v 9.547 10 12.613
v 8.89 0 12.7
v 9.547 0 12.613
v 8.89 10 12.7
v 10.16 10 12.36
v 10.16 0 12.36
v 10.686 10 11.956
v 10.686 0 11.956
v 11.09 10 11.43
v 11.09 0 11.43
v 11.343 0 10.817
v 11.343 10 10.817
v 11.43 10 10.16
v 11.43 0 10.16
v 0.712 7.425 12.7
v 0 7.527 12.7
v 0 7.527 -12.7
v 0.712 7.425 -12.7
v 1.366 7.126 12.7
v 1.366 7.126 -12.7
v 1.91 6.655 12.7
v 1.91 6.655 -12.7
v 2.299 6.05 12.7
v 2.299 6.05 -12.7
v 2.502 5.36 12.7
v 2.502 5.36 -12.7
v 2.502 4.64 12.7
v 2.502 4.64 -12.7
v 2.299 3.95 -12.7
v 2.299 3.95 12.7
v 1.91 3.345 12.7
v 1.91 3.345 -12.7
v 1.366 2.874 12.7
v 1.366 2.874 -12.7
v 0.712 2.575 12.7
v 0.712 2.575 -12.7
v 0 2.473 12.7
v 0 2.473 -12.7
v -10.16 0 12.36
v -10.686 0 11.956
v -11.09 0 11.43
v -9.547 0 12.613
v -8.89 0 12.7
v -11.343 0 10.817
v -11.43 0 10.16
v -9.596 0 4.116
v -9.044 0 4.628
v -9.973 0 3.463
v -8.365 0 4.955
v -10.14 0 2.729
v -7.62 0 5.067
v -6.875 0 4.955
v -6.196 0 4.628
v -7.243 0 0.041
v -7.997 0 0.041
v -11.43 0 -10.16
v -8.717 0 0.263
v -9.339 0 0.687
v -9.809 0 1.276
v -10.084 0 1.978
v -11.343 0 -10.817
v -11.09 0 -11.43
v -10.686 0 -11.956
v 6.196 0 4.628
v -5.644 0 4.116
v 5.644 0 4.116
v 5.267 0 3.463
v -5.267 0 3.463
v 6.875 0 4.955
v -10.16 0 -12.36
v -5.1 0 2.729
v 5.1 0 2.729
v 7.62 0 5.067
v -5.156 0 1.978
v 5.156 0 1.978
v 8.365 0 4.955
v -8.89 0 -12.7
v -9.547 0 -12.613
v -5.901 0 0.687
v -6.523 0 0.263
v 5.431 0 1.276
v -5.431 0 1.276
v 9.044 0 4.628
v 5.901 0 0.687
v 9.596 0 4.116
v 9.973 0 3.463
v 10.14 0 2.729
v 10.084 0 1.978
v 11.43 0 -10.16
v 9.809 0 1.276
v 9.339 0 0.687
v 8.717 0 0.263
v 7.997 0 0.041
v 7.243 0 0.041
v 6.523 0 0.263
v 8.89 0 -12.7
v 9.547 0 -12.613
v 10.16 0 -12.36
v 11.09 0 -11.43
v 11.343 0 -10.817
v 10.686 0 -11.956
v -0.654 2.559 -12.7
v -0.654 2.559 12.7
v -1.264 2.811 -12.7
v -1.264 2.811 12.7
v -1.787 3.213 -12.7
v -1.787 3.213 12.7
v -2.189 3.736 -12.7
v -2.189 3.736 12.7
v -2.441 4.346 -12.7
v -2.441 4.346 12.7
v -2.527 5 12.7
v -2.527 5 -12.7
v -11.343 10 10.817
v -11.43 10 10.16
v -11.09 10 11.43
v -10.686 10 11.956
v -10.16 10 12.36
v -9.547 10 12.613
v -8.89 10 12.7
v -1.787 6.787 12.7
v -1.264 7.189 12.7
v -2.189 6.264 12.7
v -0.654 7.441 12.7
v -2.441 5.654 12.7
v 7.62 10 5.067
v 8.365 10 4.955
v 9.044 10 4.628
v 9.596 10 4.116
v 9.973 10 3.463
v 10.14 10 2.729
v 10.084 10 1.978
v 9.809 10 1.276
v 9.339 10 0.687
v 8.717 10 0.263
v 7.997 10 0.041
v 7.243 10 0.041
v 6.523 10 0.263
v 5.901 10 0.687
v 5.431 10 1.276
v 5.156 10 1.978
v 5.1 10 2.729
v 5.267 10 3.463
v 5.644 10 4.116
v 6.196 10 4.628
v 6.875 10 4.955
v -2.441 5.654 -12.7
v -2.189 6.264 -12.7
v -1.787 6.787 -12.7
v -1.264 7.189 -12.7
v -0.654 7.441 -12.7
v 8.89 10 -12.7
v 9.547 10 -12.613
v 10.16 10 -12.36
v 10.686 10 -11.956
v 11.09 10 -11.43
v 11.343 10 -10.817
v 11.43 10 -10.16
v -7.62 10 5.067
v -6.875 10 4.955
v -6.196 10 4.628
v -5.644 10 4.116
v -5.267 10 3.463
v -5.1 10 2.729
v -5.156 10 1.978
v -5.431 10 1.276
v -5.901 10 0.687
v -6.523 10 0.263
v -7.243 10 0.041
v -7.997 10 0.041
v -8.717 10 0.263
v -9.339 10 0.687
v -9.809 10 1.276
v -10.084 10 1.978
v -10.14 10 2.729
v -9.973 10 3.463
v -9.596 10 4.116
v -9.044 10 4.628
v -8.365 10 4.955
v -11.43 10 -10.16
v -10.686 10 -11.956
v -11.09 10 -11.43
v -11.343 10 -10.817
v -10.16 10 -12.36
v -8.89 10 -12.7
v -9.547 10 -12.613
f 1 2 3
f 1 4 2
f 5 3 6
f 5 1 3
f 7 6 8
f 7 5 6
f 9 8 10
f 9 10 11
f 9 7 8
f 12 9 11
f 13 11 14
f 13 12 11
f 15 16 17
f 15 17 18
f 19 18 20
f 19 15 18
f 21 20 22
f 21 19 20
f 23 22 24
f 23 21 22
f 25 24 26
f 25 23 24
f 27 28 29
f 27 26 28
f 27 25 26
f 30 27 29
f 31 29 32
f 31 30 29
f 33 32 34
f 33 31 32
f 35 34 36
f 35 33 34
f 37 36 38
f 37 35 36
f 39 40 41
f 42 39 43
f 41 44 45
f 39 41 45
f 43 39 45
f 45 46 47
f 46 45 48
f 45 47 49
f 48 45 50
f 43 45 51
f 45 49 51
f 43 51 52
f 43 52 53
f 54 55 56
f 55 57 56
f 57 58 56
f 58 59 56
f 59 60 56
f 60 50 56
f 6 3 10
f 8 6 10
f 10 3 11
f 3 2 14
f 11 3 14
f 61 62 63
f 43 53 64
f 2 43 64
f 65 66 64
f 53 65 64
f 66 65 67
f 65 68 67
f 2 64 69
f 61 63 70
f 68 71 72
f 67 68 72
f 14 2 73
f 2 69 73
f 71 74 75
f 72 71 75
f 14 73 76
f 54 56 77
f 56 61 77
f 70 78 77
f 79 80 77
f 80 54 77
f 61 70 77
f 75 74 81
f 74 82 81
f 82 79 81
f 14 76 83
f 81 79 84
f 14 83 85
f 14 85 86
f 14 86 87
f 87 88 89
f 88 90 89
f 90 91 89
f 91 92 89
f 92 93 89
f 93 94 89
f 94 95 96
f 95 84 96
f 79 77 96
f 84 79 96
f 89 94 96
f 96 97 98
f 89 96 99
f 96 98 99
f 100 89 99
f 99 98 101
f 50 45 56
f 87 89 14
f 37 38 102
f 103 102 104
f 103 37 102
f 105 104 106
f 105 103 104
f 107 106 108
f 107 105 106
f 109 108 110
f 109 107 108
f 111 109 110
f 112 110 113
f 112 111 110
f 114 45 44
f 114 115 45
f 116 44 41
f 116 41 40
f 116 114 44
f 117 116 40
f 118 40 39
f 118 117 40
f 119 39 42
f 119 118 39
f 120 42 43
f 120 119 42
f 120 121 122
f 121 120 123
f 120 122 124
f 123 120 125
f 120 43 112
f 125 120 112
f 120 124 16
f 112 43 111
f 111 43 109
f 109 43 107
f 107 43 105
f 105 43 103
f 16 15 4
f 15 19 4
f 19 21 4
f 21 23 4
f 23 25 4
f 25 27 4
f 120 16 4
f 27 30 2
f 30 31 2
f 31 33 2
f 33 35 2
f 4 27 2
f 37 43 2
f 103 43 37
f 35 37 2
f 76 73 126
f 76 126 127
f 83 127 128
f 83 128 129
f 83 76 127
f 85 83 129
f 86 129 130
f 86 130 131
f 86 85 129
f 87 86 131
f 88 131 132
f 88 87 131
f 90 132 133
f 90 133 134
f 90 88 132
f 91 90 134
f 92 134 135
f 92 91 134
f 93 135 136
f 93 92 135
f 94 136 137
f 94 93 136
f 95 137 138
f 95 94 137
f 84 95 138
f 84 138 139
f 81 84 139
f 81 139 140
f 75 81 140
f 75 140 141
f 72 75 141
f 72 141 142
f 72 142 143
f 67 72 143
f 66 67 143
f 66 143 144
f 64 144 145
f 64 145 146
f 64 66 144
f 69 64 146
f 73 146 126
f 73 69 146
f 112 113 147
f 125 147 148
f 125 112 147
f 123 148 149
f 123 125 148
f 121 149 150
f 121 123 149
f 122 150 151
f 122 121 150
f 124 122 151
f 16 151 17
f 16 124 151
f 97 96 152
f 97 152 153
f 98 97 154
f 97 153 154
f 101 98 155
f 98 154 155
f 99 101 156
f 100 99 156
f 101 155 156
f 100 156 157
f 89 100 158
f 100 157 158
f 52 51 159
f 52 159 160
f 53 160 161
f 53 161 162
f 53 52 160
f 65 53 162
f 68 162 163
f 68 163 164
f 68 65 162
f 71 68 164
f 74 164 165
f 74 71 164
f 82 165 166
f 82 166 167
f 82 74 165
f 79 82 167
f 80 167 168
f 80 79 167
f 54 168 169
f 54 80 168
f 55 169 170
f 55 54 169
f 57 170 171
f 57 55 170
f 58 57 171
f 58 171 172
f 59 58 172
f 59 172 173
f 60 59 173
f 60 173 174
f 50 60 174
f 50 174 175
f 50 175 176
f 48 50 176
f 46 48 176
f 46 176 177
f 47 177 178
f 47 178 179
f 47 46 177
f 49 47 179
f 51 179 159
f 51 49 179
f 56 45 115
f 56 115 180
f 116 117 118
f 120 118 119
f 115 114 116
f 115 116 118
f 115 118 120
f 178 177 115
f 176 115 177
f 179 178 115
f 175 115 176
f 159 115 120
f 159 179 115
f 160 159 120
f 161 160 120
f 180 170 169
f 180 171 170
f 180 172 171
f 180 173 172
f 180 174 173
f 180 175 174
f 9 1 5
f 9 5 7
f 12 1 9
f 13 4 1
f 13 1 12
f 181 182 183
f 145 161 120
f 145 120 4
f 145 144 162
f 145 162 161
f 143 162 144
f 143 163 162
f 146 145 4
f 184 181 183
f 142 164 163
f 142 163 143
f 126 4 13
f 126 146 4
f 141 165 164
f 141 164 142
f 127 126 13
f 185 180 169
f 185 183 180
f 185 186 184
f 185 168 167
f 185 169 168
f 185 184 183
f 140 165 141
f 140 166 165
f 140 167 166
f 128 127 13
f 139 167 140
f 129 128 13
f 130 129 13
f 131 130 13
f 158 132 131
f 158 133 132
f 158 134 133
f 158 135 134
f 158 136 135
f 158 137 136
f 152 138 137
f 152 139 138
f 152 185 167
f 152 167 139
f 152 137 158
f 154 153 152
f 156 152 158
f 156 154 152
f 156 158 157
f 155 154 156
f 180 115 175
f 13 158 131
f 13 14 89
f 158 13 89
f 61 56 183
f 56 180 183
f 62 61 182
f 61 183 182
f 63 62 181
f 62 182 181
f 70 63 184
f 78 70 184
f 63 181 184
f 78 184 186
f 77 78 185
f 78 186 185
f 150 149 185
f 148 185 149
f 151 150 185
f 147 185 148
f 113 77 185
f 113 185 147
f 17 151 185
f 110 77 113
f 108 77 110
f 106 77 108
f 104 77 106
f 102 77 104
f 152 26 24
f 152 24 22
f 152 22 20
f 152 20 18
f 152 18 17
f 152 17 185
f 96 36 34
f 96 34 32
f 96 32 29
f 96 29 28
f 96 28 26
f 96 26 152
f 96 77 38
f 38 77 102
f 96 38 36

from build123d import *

# Parameters (mm, degrees)
SKETCH1_W           = 22.86
SKETCH1_H           = 25.4
SKETCH1_R           = 2.5273
BOSS_EXTRUDE1_DEPTH = 10
FILLET1_R           = 2.54
CUT_EXTRUDE1_DEPTH  = 30.594001081


with BuildPart() as part:
    # Sketch1 → Boss-Extrude1 (new body)
    with BuildSketch(Plane(origin=(0, 0, 0), x_dir=(1, 0, 0), z_dir=(0, 1, 0))):
        Rectangle(SKETCH1_W, SKETCH1_H)
        with Locations(Location((-7.62, -2.54, 0), (0, 0, 270))):
            Circle(SKETCH1_R, mode=Mode.SUBTRACT)
        with Locations(Location((7.62, -2.54, 0), (0, 0, 270))):
            Circle(SKETCH1_R, mode=Mode.SUBTRACT)
    extrude(amount=BOSS_EXTRUDE1_DEPTH)

    # Fillet1
    fillet1_edges = [part.edges().sort_by_distance(p)[0] for p in [
        (11.43, 5, 12.7),
        (-11.43, 5, 12.7),
        (-11.43, 5, -12.7),
        (11.43, 5, -12.7),
    ]]
    fillet(fillet1_edges, radius=FILLET1_R)

    # Sketch4 → Cut-Extrude1 (cut, through all)
    with BuildSketch(Plane(origin=(0, 0, 12.7), x_dir=(-1, 0, 0), z_dir=(0, 0, -1))):
        with BuildLine():
            ThreePointArc((0, 7.5273), (-2.5273, 5), (0, 2.4727))
            Line((0, 2.4727), (0, 7.5273))
        make_face()
        with BuildLine():
            Line((0, 7.5273), (0, 2.4727))
            ThreePointArc((0, 2.4727), (1.787070968, 3.212929032), (2.5273, 5))
            ThreePointArc((2.5273, 5), (1.787070968, 6.787070968), (0, 7.5273))
        make_face()
    extrude(amount=CUT_EXTRUDE1_DEPTH, mode=Mode.SUBTRACT)


solid = part.part
